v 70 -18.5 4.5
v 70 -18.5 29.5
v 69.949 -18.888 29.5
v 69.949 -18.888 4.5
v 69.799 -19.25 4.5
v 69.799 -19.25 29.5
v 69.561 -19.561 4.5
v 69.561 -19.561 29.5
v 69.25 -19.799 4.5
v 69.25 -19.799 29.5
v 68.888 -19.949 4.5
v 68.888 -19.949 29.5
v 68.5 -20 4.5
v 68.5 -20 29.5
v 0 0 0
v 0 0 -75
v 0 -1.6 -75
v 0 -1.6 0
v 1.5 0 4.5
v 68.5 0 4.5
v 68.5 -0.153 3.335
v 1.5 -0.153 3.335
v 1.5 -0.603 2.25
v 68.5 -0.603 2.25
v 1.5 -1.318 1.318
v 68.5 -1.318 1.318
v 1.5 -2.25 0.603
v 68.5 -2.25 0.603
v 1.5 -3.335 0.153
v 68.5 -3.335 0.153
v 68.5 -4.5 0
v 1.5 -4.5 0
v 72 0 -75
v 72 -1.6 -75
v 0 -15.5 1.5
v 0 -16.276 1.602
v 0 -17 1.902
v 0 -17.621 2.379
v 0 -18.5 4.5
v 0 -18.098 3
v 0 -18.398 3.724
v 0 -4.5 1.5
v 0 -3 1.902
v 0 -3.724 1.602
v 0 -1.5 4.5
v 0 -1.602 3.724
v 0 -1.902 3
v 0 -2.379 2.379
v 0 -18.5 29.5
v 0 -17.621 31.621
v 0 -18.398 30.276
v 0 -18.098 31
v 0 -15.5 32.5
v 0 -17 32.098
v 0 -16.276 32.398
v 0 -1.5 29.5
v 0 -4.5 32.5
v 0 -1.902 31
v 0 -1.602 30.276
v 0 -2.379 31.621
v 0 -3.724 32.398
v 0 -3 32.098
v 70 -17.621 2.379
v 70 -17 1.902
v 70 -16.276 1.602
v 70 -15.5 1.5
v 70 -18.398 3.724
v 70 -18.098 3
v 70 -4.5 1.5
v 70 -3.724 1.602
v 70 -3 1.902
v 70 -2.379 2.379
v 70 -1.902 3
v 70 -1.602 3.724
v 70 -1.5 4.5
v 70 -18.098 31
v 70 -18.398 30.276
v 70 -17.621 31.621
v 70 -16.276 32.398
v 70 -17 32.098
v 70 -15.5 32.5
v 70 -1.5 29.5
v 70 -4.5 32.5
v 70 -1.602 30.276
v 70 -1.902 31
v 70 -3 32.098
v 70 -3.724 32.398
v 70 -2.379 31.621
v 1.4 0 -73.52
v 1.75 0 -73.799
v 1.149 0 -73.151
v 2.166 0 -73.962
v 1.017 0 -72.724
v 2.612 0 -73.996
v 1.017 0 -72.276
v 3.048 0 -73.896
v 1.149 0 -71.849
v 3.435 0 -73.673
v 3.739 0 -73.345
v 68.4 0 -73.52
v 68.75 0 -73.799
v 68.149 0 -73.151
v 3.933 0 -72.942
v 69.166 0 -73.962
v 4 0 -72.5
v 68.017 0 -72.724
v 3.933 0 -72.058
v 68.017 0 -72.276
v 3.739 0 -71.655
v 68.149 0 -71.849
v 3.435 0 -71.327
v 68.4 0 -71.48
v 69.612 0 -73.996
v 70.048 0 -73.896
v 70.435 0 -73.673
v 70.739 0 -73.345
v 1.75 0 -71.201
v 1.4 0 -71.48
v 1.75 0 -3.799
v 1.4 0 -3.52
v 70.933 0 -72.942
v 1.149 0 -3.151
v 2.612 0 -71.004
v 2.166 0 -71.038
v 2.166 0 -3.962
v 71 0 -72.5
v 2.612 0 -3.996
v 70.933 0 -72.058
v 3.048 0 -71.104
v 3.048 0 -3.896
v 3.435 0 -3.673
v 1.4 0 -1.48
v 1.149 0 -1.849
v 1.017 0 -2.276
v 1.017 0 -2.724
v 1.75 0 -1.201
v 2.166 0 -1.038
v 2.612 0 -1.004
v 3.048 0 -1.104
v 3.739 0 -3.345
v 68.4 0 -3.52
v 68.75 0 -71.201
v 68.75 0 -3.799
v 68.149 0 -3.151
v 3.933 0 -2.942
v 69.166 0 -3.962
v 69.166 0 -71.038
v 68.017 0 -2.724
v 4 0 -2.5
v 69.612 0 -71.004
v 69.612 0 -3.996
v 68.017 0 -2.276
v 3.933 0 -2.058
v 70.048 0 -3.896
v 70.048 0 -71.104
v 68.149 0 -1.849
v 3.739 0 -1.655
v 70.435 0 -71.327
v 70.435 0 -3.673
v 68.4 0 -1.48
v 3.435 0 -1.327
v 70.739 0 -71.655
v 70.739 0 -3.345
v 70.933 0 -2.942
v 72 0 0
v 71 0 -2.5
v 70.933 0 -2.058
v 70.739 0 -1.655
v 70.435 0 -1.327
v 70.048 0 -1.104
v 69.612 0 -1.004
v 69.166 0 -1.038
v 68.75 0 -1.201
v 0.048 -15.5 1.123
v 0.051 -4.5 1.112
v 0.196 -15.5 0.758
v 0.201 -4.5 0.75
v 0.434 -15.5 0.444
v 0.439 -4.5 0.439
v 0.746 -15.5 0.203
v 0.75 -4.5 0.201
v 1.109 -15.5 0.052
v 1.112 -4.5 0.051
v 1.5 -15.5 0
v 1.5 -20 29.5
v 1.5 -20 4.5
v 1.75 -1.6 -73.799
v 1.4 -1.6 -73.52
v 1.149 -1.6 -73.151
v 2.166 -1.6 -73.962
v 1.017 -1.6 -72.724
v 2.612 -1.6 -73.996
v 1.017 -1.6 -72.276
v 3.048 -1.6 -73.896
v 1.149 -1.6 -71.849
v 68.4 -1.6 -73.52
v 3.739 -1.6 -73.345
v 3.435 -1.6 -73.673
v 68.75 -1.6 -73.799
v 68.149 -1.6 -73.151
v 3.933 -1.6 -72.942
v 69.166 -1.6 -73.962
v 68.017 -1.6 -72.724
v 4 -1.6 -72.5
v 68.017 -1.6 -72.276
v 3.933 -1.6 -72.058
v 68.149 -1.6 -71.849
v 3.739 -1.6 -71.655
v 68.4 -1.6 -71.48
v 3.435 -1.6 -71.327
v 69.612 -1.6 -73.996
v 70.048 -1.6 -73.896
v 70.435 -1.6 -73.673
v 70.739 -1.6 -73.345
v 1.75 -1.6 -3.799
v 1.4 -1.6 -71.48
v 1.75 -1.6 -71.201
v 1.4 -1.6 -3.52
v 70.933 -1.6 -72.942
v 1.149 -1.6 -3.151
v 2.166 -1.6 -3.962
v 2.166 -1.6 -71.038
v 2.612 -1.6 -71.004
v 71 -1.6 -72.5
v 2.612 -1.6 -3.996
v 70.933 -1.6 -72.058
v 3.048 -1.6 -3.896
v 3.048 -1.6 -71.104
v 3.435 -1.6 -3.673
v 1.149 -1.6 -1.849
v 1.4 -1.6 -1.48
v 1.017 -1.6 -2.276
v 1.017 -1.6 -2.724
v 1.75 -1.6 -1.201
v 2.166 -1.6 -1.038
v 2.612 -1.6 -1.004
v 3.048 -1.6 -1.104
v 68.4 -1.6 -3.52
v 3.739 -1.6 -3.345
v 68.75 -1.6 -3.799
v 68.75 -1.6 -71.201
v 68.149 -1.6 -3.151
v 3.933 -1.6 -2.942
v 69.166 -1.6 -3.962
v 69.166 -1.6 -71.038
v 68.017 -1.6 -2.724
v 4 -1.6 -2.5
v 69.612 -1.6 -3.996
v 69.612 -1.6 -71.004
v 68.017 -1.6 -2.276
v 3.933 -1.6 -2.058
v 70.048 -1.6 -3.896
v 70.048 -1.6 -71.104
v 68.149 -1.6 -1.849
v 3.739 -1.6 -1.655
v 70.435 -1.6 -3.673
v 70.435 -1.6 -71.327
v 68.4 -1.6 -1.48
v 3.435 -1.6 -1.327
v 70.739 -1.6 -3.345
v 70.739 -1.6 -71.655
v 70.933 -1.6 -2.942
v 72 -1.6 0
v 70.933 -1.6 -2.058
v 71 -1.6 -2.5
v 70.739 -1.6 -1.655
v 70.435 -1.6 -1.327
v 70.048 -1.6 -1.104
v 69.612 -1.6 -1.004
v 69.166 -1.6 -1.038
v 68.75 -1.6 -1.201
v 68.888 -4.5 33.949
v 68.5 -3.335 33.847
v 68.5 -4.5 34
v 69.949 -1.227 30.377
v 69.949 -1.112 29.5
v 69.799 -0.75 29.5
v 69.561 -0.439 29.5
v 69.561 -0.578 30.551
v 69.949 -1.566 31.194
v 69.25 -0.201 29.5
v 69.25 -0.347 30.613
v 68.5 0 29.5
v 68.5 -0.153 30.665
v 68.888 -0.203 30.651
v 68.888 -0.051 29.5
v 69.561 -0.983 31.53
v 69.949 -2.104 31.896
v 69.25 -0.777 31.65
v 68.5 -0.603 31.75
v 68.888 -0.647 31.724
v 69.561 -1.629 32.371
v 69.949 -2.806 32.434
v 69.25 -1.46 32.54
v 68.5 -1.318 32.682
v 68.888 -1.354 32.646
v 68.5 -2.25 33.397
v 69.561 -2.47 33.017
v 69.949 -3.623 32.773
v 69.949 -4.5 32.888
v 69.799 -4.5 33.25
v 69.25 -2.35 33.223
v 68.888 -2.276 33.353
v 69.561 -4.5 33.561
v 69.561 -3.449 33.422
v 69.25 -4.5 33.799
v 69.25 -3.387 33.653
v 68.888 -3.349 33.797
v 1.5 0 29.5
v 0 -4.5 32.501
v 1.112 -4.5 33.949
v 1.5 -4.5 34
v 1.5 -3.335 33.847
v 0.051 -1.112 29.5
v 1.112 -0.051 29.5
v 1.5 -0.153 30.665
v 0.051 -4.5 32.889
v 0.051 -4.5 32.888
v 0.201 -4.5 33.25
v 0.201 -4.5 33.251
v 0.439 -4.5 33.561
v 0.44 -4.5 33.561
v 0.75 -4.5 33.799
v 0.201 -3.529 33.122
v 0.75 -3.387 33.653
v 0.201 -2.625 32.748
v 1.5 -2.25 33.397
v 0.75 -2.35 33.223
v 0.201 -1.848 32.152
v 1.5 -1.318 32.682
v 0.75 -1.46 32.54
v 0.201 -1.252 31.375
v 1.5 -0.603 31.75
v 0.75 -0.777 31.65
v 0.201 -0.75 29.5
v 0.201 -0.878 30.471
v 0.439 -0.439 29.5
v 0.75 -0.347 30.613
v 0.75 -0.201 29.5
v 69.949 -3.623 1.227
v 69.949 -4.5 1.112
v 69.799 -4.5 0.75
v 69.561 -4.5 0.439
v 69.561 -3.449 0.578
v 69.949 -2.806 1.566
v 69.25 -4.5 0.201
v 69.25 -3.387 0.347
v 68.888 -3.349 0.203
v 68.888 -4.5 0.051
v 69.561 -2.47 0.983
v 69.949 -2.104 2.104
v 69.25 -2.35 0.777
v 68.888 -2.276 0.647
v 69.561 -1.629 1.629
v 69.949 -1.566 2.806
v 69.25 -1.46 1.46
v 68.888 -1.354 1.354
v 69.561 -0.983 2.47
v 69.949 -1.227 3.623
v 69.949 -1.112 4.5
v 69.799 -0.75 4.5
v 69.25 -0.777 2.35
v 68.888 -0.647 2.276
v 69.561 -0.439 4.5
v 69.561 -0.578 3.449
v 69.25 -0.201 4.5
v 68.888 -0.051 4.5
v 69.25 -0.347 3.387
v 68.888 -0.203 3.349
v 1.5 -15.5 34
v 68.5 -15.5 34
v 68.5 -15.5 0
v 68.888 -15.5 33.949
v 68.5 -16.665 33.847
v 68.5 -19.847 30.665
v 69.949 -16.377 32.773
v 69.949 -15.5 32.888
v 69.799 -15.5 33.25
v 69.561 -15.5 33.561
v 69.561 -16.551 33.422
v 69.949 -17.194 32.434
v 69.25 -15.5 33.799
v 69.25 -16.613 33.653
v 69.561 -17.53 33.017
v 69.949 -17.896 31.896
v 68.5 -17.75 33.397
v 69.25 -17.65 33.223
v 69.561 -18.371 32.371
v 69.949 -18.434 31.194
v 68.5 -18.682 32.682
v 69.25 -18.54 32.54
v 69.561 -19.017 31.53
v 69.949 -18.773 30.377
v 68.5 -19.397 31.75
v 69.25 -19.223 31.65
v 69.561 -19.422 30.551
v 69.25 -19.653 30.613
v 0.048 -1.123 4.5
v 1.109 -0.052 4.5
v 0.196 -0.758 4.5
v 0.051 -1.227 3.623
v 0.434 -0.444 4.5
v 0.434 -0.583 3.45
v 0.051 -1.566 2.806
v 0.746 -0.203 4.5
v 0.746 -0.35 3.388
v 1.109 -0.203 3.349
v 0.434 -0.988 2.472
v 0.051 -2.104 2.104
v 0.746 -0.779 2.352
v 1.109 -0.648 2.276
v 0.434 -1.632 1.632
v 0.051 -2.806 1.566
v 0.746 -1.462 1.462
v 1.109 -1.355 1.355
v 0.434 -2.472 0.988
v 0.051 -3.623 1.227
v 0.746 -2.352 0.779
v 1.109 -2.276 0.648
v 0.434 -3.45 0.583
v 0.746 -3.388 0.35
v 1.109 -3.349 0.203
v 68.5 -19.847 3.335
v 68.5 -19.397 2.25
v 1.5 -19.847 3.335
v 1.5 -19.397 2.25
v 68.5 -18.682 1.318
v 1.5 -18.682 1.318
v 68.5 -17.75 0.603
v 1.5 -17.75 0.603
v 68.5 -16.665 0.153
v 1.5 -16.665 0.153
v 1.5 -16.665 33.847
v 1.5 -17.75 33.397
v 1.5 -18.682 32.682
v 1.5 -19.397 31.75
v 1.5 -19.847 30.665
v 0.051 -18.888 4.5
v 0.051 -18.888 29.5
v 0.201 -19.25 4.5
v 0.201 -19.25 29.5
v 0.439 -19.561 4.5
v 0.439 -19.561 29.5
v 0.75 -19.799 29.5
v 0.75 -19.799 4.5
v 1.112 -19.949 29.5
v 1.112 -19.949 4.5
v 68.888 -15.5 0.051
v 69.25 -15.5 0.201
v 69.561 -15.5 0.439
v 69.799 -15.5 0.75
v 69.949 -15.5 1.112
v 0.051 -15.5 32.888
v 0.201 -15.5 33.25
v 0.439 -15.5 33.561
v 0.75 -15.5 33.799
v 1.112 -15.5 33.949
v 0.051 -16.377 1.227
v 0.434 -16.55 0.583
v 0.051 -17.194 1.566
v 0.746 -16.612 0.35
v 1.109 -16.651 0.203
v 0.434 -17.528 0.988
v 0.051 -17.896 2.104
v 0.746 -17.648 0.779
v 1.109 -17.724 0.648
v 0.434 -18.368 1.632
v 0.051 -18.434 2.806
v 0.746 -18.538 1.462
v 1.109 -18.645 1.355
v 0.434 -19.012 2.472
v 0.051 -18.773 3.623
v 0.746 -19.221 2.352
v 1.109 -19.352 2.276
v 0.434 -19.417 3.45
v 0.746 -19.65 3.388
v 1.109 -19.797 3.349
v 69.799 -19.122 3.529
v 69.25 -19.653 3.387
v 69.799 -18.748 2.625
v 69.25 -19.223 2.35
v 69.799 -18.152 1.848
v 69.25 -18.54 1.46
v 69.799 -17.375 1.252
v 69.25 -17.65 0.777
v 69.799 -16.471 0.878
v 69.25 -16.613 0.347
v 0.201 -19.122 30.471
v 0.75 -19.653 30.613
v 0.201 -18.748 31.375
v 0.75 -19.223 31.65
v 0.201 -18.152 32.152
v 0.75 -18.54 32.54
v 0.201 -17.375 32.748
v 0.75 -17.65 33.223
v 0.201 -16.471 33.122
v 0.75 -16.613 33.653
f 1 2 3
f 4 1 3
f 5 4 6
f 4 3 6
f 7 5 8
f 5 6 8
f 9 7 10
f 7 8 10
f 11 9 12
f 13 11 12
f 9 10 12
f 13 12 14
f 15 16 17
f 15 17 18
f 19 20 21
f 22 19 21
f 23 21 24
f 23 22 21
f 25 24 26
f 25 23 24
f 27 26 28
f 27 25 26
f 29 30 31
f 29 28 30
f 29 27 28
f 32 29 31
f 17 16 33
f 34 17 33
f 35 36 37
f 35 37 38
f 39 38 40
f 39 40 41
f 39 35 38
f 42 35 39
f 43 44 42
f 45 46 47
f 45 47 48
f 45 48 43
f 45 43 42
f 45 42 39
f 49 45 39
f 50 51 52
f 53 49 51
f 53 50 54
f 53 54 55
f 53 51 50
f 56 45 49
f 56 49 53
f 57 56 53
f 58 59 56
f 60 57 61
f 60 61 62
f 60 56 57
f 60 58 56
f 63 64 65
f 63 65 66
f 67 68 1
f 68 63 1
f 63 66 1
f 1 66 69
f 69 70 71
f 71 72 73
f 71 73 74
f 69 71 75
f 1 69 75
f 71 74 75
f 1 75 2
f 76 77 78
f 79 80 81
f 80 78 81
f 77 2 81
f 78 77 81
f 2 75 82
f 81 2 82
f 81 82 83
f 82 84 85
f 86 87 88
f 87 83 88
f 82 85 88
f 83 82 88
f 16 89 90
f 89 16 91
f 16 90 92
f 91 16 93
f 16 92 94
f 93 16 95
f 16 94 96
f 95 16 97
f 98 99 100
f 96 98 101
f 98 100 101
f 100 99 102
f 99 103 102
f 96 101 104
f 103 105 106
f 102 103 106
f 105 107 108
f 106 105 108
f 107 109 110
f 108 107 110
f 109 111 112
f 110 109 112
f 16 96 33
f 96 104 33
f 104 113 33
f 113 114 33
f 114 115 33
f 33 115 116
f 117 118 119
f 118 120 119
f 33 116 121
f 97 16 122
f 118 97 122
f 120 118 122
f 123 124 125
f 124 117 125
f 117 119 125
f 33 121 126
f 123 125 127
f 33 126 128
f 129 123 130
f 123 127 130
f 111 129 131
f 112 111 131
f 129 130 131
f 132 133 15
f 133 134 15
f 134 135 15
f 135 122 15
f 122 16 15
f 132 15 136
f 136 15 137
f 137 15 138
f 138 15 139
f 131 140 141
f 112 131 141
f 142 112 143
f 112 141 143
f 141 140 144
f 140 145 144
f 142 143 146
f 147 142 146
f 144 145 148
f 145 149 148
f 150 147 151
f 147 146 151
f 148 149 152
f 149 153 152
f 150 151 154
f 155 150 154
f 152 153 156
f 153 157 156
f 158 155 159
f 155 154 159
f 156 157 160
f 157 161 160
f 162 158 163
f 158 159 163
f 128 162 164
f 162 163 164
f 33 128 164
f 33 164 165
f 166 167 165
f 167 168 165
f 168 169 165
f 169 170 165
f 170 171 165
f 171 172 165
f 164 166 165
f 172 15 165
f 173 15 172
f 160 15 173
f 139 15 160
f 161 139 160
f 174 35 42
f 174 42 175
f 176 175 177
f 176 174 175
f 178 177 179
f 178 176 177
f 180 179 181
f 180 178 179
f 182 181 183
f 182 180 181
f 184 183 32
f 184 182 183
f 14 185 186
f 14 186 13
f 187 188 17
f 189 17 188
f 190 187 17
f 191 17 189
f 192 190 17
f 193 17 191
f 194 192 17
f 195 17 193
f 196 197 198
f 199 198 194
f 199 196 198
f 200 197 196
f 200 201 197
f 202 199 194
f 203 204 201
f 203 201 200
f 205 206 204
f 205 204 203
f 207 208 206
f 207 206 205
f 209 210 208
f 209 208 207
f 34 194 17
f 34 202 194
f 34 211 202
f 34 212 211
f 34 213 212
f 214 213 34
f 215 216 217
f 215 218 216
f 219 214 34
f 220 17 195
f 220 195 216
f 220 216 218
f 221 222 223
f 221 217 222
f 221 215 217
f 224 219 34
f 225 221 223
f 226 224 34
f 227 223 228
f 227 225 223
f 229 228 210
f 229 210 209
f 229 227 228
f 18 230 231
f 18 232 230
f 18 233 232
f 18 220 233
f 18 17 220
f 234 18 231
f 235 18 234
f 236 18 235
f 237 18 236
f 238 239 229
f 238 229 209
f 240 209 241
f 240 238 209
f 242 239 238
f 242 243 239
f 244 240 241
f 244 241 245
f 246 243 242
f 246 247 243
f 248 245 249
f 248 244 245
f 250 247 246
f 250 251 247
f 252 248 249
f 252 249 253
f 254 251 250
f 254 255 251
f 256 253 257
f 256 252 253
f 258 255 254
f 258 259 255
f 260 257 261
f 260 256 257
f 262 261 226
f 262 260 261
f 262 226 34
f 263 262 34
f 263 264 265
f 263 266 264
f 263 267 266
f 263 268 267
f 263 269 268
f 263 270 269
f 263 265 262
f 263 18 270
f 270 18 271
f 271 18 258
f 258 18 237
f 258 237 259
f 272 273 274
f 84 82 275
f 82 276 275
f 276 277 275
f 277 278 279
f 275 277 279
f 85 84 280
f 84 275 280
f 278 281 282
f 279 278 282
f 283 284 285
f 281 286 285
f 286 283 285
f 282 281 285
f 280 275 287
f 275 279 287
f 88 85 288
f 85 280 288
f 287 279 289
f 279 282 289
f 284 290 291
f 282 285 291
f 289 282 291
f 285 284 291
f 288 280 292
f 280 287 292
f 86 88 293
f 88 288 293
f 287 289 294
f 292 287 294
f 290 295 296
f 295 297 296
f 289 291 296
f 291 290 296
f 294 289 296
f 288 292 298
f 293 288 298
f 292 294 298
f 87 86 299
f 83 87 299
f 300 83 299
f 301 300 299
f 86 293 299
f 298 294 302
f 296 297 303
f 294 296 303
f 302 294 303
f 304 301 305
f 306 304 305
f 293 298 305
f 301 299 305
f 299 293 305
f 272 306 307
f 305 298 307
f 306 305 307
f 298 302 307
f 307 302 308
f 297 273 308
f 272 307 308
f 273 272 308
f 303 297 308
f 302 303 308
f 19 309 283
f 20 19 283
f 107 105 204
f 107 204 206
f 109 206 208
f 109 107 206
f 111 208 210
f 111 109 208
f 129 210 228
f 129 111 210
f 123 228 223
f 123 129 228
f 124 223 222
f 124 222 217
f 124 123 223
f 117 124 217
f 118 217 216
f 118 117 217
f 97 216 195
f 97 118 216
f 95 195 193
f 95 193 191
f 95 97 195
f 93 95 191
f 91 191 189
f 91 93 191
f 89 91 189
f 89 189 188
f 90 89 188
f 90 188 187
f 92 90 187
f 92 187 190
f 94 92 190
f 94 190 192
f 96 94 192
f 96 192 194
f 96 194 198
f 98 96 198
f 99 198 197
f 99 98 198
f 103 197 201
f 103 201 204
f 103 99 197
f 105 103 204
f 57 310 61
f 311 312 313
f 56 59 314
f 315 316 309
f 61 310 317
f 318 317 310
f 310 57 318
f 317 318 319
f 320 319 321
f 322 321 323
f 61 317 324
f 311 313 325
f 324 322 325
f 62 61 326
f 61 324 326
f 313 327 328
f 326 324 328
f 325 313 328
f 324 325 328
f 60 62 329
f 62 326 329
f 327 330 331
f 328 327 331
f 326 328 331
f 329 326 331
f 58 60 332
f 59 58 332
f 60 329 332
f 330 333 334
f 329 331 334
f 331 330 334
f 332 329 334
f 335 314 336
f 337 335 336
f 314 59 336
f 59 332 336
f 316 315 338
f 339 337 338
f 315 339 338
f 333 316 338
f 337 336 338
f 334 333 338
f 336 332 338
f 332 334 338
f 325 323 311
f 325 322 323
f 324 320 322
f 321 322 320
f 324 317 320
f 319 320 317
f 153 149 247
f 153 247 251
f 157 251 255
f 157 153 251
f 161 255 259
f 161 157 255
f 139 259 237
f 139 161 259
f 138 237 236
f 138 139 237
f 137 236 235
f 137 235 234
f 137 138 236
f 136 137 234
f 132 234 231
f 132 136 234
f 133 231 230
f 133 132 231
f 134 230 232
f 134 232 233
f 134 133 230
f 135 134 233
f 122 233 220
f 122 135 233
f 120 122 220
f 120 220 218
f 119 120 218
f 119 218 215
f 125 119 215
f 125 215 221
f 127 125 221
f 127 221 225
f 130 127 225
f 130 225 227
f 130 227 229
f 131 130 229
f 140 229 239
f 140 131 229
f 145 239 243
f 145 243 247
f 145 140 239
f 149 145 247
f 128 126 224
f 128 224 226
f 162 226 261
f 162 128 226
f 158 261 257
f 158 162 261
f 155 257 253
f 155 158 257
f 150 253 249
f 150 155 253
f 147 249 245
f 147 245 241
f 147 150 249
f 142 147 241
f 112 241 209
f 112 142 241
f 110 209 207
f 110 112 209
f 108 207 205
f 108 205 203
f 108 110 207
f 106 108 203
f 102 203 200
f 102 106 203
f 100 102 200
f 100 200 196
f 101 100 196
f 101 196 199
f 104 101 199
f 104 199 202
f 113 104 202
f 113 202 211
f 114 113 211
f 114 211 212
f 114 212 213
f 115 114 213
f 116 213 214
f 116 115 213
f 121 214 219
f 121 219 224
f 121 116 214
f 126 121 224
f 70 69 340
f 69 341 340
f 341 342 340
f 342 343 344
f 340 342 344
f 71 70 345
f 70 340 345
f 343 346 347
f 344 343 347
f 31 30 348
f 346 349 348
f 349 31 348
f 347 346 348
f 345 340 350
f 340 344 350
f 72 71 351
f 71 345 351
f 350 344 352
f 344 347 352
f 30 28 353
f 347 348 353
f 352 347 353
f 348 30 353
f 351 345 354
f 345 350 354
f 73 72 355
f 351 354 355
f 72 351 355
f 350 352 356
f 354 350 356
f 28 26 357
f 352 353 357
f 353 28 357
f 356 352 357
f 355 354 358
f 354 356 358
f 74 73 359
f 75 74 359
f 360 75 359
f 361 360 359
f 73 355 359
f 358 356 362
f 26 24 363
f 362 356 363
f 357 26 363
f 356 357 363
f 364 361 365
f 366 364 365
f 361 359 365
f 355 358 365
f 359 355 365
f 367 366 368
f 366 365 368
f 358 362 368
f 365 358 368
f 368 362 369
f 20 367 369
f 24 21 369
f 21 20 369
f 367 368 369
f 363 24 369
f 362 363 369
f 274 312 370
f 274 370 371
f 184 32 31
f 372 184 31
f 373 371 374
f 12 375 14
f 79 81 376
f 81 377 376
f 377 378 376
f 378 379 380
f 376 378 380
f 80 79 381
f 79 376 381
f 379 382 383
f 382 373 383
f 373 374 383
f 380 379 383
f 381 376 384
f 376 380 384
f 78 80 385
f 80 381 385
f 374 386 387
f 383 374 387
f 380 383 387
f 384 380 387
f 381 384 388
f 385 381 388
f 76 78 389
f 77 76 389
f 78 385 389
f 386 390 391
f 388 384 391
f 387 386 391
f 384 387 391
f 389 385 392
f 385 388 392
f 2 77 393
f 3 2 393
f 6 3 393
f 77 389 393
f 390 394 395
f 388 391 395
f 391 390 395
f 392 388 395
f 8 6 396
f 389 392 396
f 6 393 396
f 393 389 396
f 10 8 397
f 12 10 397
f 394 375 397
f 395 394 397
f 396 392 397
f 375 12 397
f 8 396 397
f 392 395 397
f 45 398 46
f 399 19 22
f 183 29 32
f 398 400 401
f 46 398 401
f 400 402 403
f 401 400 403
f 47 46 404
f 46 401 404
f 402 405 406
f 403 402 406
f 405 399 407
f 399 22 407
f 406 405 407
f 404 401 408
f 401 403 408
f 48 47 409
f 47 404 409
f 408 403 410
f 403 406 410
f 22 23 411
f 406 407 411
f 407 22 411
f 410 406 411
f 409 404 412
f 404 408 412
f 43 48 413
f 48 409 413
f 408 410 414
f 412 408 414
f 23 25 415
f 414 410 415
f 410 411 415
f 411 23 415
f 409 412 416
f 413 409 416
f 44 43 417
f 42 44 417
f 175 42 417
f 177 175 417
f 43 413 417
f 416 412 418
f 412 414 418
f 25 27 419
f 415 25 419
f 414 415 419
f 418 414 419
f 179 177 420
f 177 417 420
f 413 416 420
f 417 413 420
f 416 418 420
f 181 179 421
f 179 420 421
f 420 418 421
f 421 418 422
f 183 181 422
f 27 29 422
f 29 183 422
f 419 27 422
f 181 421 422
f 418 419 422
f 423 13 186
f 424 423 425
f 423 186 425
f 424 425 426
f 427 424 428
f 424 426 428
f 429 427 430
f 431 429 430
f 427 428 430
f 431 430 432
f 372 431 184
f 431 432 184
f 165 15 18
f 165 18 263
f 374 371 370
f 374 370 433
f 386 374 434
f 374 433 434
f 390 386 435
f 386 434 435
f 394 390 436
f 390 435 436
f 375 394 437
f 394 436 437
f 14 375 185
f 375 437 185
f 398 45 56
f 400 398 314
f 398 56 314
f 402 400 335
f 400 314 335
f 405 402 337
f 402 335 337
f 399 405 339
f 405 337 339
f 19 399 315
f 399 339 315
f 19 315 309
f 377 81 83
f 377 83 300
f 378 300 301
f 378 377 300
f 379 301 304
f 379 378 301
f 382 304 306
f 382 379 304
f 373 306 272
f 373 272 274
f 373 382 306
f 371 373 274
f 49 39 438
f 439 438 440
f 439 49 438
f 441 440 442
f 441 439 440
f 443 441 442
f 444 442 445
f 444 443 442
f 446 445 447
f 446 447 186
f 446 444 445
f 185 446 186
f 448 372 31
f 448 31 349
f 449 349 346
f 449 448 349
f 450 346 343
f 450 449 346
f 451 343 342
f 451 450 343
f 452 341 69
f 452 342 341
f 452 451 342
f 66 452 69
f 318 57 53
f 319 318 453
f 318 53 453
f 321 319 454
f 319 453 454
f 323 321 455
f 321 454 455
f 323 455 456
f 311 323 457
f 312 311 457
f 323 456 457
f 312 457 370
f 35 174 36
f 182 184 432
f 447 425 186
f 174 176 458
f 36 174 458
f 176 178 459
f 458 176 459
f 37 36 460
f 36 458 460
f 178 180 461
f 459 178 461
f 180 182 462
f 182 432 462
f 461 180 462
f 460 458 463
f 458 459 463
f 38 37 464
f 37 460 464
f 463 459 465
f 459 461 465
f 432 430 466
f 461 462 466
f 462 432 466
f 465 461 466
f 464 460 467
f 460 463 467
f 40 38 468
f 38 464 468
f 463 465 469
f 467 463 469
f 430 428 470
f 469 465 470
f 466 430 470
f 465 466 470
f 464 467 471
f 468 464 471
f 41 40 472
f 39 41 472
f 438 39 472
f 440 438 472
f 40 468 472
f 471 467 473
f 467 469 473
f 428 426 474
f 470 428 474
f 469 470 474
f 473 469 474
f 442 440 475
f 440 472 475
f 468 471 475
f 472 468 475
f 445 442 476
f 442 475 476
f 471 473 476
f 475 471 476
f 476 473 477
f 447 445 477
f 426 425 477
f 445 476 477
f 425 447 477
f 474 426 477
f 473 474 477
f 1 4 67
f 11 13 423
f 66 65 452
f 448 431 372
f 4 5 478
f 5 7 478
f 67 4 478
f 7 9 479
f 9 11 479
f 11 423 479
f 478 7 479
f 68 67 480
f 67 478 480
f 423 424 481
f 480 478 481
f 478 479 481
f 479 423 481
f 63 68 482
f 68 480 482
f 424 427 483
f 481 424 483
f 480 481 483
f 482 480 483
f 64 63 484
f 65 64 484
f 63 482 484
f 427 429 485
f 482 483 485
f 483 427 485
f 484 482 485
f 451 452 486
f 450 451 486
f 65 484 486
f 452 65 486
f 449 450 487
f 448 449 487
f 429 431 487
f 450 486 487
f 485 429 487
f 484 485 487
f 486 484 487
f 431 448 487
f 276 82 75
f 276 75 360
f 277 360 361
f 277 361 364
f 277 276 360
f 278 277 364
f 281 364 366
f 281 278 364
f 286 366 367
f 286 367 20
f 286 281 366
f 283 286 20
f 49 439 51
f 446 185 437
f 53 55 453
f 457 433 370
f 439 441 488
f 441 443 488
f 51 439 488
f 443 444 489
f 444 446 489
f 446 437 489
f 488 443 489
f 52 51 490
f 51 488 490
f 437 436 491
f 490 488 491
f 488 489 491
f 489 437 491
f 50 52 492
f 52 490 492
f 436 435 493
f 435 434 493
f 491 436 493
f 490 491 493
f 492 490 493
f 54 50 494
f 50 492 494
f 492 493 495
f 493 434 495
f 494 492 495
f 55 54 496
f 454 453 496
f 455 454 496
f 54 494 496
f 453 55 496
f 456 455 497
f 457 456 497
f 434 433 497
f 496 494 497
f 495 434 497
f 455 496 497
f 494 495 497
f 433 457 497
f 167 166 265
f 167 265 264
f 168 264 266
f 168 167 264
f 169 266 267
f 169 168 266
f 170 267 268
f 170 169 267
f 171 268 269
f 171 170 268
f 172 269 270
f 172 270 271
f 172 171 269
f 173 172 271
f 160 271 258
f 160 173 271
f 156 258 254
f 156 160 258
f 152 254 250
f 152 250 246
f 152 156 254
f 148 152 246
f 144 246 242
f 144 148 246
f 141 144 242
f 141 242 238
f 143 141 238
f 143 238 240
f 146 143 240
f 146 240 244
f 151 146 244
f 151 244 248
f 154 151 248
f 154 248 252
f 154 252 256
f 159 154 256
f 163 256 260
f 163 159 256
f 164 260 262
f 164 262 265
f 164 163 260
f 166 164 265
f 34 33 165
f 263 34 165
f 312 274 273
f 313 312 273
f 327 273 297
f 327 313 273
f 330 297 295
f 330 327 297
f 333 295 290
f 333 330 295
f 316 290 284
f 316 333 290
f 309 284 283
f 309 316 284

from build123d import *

# Parameters (mm, degrees)
F0_W         = 72
F0_H         = 75
F0_R         = 1.5
F1_DEPTH     = 1.6
F2_W         = 70
F2_H         = 34
F3_DEPTH     = 20
F4_R         = 1.5
F5_T1_DEPTH  = 70
F5_T4_ANGLE  = 90
F5_T6_ANGLE  = 90
F5_T8_ANGLE  = 90
F5_T10_ANGLE = 90
F5_T12_ANGLE = 90
F5_T14_ANGLE = 90
F5_T16_ANGLE = 90
F5_T18_ANGLE = 90


# Not quite as in the source:
# - a fillet or chamfer that OpenCascade refuses, or shapes differently, is made with other operations: its cross-section is extruded or revolved along the edge and cut away or added


with BuildPart() as f1:
    # F0 (on Front) → F1 (new body)
    with BuildSketch(Plane.XZ):
        with Locations((36, -37.5)):
            Rectangle(F0_W, F0_H)
        with Locations((2.5, -72.5)):
            Circle(F0_R, mode=Mode.SUBTRACT)
        with Locations((69.5, -72.5)):
            Circle(F0_R, mode=Mode.SUBTRACT)
        with Locations((2.5, -2.5)):
            Circle(F0_R, mode=Mode.SUBTRACT)
        with Locations((69.5, -2.5)):
            Circle(F0_R, mode=Mode.SUBTRACT)
    extrude(amount=F1_DEPTH)


with BuildPart() as f3:
    # F2 (on Front) → F3 (new body)
    with BuildSketch(Plane.XZ):
        with Locations((35, 17)):
            Rectangle(F2_W, F2_H)
    extrude(amount=F3_DEPTH)

    # F4
    f4_edges = [f3.edges().sort_by_distance(p)[0] for p in [
        (70, -10, 0),
        (70, -10, 34),
        (70, 0, 17),
        (70, -20, 17),
        (0, -10, 34),
        (0, -10, 0),
        (0, 0, 17),
        (0, -20, 17),
    ]]
    fillet(f4_edges, radius=F4_R)

    # F5: fillet of radius 4.5 on 4 edges, made by hand

    # F5_s2 → F5_t1 (cut)
    with BuildSketch(Plane.YZ):
        with BuildLine():
            ThreePointArc((-4.5, 34), (-1.3180194847, 32.6819805153), (0, 29.5))
            Line((0, 29.5), (0, 34))
            Line((0, 34), (-4.5, 34))
        make_face()
        with BuildLine():
            ThreePointArc((0, 4.5), (-1.3180194847, 1.3180194847), (-4.5, 0))
            Line((-4.5, 0), (0, 0))
            Line((0, 0), (0, 4.5))
        make_face()
        with BuildLine():
            ThreePointArc((-15.5, 34), (-18.6819805153, 32.6819805153), (-20, 29.5))
            Line((-20, 29.5), (-20, 34))
            Line((-20, 34), (-15.5, 34))
        make_face()
        with BuildLine():
            ThreePointArc((-20, 4.5), (-18.6819805153, 1.3180194847), (-15.5, 0))
            Line((-15.5, 0), (-20, 0))
            Line((-20, 0), (-20, 4.5))
        make_face()
    extrude(amount=F5_T1_DEPTH, mode=Mode.SUBTRACT)

    # F5_s3 → F5_t4 (revolve, cut)
    with BuildSketch(Plane.XZ.offset(15.5)):
        with BuildLine():
            ThreePointArc((0, 1.5), (0.4393398282, 0.4393398282), (1.5, 0))
            Line((1.5, 0), (0, 0))
            Line((0, 0), (0, 1.5))
        make_face()
    revolve(axis=Axis((0, -15.5, 4.5), (-1, 0, 0)), revolution_arc=F5_T4_ANGLE, mode=Mode.SUBTRACT)

    # F5_s5 → F5_t6 (revolve, cut)
    with BuildSketch(Plane.XY.offset(4.5)):
        with BuildLine():
            ThreePointArc((70, -18.5), (69.5606601718, -19.5606601718), (68.5, -20))
            Line((68.5, -20), (70, -20))
            Line((70, -20), (70, -18.5))
        make_face()
    revolve(axis=Axis((70, -15.5, 4.5), (1, 0, 0)), revolution_arc=F5_T6_ANGLE, mode=Mode.SUBTRACT)

    # F5_s7 → F5_t8 (revolve, cut)
    with BuildSketch(Plane.XZ.offset(15.5)):
        with BuildLine():
            ThreePointArc((70, 32.5), (69.5606601718, 33.5606601718), (68.5, 34))
            Line((68.5, 34), (70, 34))
            Line((70, 34), (70, 32.5))
        make_face()
    revolve(axis=Axis((70, -15.5, 29.5), (1, 0, 0)), revolution_arc=F5_T8_ANGLE, mode=Mode.SUBTRACT)

    # F5_s9 → F5_t10 (revolve, cut)
    with BuildSketch(Plane.XY.offset(29.5)):
        with BuildLine():
            ThreePointArc((0, -18.5), (0.4393398282, -19.5606601718), (1.5, -20))
            Line((1.5, -20), (0, -20))
            Line((0, -20), (0, -18.5))
        make_face()
    revolve(axis=Axis((0, -15.5, 29.5), (-1, 0, 0)), revolution_arc=F5_T10_ANGLE, mode=Mode.SUBTRACT)

    # F5_s11 → F5_t12 (revolve, cut)
    with BuildSketch(Plane.XY.offset(4.5)):
        with BuildLine():
            ThreePointArc((0, -1.5), (0.4393398282, -0.4393398282), (1.5, 0))
            Line((1.5, 0), (0, 0))
            Line((0, 0), (0, -1.5))
        make_face()
    revolve(axis=Axis((0, -4.5, 4.5), (-1, 0, 0)), revolution_arc=F5_T12_ANGLE, mode=Mode.SUBTRACT)

    # F5_s13 → F5_t14 (revolve, cut)
    with BuildSketch(Plane.XZ.offset(4.5)):
        with BuildLine():
            ThreePointArc((70, 1.5), (69.5606601718, 0.4393398282), (68.5, 0))
            Line((68.5, 0), (70, 0))
            Line((70, 0), (70, 1.5))
        make_face()
    revolve(axis=Axis((70, -4.5, 4.5), (1, 0, 0)), revolution_arc=F5_T14_ANGLE, mode=Mode.SUBTRACT)

    # F5_s15 → F5_t16 (revolve, cut)
    with BuildSketch(Plane.XY.offset(29.5)):
        with BuildLine():
            ThreePointArc((70, -1.5), (69.5606601718, -0.4393398282), (68.5, 0))
            Line((68.5, 0), (70, 0))
            Line((70, 0), (70, -1.5))
        make_face()
    revolve(axis=Axis((70, -4.5, 29.5), (1, 0, 0)), revolution_arc=F5_T16_ANGLE, mode=Mode.SUBTRACT)

    # F5_s17 → F5_t18 (revolve, cut)
    with BuildSketch(Plane.XZ.offset(4.5)):
        with BuildLine():
            ThreePointArc((0, 32.5), (0.4393398282, 33.5606601718), (1.5, 34))
            Line((1.5, 34), (0, 34))
            Line((0, 34), (0, 32.5))
        make_face()
    revolve(axis=Axis((0, -4.5, 29.5), (-1, 0, 0)), revolution_arc=F5_T18_ANGLE, mode=Mode.SUBTRACT)


solid = Compound([f1.part, f3.part])
